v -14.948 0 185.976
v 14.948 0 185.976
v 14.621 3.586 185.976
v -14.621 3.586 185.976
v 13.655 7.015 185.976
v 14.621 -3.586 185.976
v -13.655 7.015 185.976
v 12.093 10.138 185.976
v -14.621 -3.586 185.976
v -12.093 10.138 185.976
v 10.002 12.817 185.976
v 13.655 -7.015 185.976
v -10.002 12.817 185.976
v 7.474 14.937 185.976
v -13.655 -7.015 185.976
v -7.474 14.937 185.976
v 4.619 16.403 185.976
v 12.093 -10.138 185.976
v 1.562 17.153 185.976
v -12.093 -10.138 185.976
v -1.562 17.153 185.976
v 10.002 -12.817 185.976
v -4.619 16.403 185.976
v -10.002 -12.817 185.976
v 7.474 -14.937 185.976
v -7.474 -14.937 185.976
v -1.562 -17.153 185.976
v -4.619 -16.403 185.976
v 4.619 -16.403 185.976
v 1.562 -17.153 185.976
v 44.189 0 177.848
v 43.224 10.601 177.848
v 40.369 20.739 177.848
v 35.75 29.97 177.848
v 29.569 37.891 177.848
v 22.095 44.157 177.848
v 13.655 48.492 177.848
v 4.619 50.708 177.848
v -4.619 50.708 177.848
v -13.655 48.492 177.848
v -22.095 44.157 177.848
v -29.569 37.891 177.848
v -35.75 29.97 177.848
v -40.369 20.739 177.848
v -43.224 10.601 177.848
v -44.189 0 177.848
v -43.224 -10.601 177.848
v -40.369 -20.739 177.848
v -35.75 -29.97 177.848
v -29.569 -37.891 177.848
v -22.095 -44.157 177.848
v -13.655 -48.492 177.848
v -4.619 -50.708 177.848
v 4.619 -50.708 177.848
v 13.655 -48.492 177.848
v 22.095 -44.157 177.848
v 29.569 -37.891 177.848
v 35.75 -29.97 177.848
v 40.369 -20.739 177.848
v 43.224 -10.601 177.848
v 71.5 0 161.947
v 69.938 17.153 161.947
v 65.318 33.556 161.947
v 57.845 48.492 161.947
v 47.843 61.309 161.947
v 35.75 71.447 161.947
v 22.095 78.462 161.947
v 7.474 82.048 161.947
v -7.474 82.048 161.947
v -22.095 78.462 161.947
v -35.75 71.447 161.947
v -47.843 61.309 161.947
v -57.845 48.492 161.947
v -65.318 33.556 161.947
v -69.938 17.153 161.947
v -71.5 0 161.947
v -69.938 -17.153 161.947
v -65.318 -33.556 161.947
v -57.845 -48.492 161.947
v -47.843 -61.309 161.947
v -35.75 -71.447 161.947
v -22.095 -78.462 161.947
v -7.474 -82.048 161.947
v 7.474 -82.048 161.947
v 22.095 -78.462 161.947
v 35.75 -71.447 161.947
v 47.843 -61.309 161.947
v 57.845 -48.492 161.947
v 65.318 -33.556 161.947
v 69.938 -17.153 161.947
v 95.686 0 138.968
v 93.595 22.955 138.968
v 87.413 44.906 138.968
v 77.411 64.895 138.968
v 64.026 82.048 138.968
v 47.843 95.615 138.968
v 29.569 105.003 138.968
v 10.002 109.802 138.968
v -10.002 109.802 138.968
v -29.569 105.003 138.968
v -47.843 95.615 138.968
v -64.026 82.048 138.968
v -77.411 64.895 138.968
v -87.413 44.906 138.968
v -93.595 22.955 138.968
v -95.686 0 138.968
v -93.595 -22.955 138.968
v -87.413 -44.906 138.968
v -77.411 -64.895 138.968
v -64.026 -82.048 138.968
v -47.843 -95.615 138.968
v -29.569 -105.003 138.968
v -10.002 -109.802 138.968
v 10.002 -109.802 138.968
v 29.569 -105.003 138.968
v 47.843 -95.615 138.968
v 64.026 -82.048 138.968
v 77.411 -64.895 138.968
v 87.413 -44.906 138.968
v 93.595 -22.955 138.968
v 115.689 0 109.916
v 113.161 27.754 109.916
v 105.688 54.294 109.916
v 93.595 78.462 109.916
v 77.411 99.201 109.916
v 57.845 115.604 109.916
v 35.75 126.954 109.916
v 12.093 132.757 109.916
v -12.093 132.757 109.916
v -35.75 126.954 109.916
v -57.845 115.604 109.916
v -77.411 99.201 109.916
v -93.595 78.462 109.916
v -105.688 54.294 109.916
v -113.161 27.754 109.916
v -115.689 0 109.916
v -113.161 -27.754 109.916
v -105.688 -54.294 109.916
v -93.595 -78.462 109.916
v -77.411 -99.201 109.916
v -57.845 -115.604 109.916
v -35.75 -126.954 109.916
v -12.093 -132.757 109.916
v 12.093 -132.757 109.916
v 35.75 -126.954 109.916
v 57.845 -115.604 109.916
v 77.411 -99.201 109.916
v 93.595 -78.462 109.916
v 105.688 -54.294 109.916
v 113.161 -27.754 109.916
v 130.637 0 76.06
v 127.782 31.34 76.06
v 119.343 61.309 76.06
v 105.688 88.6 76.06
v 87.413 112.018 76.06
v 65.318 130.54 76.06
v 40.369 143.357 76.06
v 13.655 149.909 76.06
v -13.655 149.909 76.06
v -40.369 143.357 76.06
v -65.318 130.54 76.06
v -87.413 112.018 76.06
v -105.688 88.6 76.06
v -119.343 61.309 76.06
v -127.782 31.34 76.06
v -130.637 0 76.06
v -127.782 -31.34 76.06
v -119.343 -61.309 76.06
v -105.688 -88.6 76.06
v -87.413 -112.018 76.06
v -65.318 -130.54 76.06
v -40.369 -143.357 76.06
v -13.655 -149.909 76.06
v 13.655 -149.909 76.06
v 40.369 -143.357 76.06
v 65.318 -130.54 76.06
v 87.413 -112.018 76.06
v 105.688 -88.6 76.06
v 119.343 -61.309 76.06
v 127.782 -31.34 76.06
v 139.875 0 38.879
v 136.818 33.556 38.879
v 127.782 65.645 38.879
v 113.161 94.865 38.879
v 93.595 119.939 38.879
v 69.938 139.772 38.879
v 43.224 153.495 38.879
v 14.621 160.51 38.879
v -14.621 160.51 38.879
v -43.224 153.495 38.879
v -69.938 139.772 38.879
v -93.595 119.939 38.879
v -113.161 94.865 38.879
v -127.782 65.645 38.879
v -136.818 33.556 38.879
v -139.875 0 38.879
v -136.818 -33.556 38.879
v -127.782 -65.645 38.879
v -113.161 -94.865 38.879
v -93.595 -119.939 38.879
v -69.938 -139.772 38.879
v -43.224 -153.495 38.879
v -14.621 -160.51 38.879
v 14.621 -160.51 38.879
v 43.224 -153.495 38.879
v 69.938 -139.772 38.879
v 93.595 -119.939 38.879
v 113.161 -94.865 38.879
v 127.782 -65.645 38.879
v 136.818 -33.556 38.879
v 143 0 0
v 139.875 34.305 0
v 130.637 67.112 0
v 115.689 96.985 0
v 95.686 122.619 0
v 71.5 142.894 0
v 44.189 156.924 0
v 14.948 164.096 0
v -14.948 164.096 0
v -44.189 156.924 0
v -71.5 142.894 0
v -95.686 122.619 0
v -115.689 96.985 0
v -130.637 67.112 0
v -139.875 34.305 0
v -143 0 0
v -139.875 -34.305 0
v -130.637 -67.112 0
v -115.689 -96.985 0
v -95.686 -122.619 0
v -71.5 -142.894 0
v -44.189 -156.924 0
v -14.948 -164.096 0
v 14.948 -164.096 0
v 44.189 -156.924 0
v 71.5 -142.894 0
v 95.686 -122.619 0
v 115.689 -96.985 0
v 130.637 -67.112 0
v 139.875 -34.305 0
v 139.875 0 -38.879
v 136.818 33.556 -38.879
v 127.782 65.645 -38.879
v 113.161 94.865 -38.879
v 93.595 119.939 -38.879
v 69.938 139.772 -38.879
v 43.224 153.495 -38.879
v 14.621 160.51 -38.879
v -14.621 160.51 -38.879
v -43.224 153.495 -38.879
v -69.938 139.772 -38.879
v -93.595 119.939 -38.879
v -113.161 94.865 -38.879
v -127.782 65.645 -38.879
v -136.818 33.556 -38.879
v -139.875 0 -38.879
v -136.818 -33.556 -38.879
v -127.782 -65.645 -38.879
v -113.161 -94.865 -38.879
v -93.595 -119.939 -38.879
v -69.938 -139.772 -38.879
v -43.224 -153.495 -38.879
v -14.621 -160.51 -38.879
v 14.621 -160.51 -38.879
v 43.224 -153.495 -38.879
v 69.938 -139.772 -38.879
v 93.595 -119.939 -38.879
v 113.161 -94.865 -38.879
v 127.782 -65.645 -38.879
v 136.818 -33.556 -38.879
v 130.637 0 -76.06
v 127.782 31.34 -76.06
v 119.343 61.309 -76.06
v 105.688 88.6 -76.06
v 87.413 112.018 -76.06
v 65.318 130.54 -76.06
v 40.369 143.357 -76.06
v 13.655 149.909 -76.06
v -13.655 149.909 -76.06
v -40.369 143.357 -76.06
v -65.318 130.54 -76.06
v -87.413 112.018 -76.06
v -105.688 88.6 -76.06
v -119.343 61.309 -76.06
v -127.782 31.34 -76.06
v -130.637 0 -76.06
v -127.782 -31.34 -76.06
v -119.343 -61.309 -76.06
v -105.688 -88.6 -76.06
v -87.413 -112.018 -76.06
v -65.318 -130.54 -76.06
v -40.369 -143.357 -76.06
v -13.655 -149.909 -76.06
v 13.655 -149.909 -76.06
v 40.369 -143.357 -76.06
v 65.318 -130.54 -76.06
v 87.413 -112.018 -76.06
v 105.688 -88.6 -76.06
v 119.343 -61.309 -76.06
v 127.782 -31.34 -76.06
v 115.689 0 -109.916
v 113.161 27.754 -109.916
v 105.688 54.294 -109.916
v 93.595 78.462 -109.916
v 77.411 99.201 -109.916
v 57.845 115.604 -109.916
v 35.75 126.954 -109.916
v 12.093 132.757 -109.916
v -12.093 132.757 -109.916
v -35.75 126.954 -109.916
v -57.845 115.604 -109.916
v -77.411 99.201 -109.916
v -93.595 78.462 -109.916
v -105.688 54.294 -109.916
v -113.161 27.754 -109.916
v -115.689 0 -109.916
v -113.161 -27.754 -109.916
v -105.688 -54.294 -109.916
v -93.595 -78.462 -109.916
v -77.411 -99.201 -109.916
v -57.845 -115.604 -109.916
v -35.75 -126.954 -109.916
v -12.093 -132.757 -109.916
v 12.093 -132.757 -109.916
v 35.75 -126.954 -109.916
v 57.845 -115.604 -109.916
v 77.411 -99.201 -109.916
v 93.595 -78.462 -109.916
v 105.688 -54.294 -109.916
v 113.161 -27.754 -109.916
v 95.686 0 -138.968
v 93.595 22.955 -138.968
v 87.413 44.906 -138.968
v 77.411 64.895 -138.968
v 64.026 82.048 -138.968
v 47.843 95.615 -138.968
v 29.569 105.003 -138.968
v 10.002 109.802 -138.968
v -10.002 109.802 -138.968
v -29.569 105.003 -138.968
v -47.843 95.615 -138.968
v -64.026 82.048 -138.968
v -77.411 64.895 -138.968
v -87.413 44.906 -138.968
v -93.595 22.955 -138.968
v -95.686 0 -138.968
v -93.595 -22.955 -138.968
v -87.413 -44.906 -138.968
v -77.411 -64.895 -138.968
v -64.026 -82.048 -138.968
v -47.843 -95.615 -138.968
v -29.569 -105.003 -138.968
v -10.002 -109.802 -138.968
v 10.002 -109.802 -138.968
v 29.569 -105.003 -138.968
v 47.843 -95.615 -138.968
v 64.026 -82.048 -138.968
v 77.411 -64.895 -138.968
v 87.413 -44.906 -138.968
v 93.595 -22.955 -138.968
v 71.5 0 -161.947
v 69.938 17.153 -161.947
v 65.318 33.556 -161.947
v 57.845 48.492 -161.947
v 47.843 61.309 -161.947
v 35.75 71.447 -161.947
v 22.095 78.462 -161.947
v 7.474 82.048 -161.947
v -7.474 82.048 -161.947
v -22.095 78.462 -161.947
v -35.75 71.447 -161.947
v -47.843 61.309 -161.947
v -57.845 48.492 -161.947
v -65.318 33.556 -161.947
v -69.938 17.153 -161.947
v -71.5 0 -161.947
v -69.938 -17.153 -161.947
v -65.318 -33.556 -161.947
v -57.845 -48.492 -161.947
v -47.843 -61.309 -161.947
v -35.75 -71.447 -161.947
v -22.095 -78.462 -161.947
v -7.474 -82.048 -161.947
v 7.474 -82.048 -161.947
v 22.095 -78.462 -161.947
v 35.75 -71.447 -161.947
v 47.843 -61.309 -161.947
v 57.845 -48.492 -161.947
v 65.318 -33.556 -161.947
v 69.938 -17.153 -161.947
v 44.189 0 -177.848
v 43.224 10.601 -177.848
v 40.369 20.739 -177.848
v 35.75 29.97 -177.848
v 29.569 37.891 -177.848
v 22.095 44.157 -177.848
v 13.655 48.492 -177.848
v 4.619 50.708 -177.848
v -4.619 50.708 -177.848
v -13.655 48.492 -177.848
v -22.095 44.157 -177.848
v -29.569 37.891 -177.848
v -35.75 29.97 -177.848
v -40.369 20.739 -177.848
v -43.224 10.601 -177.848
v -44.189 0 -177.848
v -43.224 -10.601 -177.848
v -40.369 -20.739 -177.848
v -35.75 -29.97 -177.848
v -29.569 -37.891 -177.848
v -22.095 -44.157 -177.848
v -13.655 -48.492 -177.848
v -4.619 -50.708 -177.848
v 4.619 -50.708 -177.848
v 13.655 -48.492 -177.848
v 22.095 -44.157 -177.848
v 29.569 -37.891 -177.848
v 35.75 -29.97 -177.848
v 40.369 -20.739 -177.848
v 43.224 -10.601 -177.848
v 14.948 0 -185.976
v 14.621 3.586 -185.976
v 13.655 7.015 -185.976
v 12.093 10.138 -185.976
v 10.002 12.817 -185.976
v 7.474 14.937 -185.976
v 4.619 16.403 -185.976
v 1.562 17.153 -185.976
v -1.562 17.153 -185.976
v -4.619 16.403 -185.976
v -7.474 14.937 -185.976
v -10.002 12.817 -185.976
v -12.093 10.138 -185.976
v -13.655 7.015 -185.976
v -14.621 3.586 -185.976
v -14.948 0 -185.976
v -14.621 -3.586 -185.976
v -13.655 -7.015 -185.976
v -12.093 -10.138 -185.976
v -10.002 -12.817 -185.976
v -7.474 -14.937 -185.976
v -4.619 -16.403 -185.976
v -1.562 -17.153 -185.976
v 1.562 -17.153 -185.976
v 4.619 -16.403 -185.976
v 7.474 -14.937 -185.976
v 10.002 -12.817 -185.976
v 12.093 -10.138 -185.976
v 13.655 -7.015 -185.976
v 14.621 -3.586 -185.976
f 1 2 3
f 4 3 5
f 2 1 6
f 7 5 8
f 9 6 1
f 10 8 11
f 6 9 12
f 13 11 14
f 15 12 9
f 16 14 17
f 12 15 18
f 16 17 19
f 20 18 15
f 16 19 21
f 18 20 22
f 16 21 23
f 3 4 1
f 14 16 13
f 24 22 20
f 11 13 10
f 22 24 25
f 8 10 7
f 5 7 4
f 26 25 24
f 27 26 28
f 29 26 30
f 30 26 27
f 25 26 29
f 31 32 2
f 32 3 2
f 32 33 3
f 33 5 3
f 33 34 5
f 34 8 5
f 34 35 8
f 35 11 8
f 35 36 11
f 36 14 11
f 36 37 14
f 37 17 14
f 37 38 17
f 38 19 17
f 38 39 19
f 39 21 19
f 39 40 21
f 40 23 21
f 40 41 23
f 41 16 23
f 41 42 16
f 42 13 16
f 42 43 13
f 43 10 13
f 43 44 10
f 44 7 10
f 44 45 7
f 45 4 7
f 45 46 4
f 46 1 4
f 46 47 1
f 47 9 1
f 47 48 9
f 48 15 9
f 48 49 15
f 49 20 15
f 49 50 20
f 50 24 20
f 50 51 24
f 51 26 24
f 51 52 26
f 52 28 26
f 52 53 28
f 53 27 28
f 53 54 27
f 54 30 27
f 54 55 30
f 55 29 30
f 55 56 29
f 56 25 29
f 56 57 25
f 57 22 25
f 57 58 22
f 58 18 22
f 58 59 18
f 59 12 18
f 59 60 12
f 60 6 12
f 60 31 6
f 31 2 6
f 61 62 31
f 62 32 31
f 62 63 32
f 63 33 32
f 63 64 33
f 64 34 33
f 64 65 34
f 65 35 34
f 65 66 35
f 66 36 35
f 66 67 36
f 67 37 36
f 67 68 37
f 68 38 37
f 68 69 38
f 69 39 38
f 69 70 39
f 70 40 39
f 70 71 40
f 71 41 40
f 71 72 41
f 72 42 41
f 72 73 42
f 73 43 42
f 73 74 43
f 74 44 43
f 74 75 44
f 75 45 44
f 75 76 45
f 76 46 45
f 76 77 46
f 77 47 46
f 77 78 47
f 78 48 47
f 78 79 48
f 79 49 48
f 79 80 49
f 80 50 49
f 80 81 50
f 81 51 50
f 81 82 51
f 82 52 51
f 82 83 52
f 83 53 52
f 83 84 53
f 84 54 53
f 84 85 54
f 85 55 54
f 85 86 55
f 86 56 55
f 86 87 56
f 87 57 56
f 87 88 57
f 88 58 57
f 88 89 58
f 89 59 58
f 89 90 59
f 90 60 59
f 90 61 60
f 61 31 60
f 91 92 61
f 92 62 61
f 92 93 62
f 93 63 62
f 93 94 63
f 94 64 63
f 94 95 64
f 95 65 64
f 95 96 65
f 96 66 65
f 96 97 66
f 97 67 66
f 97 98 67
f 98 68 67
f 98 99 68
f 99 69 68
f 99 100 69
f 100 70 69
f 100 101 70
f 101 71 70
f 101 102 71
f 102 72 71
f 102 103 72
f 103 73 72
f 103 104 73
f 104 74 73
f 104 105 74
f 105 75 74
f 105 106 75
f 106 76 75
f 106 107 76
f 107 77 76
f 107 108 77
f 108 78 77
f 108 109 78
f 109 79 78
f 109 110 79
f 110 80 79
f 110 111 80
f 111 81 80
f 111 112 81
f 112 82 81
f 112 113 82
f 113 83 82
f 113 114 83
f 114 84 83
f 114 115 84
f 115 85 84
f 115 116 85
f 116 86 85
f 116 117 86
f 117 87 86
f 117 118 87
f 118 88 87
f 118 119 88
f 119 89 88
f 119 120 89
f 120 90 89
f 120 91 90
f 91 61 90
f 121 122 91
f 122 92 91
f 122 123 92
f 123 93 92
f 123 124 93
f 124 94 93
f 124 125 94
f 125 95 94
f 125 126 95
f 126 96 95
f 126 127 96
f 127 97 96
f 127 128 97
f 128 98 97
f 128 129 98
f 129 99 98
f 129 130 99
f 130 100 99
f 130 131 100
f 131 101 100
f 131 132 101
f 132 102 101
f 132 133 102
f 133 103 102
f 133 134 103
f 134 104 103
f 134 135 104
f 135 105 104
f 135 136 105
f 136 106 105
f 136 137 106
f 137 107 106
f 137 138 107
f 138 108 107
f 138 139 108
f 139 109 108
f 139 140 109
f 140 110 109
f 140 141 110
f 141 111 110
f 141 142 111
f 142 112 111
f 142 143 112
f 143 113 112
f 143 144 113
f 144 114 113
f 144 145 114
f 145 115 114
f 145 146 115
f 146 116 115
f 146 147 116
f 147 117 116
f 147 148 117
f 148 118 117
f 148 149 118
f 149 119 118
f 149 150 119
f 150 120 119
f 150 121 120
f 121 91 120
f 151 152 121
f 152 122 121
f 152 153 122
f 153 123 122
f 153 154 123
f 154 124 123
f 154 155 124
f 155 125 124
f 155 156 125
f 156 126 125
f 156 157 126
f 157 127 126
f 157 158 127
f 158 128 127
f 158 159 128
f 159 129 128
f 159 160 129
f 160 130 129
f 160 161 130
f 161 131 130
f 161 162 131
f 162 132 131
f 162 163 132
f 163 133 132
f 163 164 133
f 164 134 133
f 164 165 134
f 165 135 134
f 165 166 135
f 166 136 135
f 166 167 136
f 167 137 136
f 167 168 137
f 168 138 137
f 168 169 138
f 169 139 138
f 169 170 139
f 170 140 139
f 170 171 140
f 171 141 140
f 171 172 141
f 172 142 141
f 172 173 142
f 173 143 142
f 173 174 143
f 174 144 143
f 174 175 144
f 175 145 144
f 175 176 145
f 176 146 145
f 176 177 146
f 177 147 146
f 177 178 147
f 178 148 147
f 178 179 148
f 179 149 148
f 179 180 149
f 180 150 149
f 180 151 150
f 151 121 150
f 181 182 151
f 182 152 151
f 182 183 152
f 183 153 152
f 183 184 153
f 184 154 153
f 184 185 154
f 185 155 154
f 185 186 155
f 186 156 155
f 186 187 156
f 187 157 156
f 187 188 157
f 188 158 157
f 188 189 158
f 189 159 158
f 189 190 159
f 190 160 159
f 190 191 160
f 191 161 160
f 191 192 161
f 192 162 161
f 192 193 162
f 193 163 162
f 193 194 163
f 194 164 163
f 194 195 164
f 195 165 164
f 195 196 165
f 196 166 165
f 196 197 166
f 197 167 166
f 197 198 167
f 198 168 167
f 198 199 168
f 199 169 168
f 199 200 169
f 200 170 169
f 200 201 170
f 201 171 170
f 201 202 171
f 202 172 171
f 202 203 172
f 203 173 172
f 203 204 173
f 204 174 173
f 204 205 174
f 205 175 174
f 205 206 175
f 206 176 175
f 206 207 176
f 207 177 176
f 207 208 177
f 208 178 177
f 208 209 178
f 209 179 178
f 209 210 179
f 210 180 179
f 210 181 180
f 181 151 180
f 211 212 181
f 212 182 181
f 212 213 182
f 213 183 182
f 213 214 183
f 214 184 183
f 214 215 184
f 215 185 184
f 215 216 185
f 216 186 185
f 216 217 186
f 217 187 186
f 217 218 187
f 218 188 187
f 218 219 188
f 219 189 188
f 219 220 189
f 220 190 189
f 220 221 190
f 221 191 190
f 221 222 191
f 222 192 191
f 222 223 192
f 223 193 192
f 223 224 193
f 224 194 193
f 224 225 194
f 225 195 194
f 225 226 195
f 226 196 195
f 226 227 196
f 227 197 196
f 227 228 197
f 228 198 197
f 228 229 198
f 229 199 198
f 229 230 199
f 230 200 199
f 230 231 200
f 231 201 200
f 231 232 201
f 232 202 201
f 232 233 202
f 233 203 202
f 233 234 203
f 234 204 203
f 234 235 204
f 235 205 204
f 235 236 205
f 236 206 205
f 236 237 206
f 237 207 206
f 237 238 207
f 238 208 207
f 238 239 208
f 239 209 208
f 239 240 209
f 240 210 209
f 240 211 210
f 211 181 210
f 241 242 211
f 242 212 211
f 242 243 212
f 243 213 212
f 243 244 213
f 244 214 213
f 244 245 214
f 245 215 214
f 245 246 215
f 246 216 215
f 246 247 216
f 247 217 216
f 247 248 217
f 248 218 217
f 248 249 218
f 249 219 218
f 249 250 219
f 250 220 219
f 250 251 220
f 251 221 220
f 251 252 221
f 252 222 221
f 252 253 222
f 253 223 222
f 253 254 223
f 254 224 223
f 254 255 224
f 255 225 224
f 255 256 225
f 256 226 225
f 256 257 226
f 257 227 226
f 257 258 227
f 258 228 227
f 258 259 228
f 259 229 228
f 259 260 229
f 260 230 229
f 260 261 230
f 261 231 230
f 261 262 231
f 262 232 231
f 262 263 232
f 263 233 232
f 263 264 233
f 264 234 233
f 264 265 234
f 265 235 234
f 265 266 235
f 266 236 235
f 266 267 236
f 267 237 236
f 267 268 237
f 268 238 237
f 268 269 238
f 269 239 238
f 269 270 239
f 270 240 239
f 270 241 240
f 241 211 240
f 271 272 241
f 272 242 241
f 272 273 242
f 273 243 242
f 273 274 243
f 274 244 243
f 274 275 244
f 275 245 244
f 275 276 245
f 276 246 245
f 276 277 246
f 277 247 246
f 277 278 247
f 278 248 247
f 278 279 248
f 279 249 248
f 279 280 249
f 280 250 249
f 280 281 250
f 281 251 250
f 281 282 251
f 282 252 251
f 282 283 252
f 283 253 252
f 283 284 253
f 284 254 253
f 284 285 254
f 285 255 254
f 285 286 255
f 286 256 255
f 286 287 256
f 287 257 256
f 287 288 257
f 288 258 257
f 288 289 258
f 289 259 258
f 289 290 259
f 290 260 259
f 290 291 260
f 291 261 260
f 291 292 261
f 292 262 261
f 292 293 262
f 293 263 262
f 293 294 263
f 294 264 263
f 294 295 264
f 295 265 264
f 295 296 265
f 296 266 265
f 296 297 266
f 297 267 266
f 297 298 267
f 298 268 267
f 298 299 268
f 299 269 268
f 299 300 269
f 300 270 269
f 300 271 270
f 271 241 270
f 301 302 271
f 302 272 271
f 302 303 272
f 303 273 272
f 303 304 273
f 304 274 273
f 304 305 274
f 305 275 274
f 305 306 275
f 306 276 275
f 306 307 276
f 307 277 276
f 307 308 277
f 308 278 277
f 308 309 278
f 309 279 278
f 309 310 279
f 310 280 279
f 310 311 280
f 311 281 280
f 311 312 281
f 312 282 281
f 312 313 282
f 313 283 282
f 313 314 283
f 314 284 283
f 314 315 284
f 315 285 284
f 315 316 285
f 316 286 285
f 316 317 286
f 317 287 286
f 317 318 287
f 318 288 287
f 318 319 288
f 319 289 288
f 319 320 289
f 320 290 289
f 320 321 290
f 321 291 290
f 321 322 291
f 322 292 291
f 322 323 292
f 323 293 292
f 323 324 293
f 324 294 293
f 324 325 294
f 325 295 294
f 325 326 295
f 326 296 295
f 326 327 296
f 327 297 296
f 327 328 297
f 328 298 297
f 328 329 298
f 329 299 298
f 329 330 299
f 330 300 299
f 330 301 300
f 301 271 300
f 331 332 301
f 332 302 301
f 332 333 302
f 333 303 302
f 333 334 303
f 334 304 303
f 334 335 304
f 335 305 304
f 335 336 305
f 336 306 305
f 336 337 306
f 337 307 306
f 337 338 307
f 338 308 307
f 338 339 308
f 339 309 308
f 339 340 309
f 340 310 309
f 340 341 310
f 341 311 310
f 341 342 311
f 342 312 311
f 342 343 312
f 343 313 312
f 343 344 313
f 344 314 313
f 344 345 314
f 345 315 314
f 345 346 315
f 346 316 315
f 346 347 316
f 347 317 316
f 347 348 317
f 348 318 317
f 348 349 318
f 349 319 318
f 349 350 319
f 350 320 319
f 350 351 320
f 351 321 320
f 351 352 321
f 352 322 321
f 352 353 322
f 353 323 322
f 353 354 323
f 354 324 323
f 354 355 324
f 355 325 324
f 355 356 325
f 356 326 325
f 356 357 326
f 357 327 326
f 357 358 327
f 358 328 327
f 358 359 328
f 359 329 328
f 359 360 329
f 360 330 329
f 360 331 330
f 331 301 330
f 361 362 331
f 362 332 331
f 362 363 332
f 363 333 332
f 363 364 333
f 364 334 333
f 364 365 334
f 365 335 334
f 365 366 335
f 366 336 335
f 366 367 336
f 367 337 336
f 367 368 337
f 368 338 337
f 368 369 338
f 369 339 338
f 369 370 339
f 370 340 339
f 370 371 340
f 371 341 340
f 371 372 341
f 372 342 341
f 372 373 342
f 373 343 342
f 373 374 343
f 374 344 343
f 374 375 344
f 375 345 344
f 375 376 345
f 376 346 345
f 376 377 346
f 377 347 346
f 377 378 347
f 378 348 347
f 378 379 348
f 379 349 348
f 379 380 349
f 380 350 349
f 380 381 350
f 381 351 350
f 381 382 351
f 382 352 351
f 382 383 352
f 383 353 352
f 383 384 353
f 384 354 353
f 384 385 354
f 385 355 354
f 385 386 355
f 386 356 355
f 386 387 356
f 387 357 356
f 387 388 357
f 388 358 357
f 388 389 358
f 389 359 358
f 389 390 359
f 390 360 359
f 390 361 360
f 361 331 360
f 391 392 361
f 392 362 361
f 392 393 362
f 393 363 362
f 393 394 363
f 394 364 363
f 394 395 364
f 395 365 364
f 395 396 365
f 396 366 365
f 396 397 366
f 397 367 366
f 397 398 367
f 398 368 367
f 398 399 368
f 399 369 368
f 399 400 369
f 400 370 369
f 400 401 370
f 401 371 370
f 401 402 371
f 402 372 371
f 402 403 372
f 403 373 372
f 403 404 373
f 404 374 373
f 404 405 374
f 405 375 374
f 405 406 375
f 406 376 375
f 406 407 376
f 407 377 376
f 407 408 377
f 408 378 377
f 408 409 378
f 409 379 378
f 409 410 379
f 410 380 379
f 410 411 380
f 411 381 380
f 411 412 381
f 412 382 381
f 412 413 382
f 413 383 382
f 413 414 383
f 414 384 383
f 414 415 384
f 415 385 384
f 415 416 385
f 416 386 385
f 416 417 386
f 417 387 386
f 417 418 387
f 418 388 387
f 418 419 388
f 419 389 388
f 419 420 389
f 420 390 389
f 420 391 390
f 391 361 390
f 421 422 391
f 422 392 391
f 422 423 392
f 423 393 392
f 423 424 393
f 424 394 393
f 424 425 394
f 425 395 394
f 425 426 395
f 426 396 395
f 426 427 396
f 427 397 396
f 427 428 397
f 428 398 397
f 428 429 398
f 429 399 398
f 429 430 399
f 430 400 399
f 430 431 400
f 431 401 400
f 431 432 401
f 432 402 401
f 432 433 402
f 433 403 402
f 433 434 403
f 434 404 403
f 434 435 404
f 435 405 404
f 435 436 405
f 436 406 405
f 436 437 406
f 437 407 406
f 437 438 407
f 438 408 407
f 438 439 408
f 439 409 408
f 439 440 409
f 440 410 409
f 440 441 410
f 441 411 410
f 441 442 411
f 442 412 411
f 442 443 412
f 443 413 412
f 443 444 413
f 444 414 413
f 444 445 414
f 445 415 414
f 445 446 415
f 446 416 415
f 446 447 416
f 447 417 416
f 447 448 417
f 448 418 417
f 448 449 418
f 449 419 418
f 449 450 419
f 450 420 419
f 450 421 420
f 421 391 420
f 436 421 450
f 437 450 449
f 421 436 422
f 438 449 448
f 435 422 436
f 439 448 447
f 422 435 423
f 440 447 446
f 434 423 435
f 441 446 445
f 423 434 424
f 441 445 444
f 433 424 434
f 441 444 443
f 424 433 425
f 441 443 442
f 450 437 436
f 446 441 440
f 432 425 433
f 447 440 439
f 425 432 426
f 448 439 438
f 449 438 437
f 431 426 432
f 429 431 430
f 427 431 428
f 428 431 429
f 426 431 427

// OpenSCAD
// Generated by SolidPython 1.0.1 on 2020-07-29 00:46:51


scale(v = [13, 15, 17]) {
	sphere(r = 11);
}
/***********************************************
*********      SolidPython code:      **********
************************************************
 
# import packages: SolidPython
from solid import *
from solid.utils import *
from itertools import chain, combinations, permutations


class Resize:

    def __init__(self, scad_file):
        self.scad_file = scad_file
        #self.scad_file = import_scad(scad_file)
        # cone/cylinder param:
        self.r1 = 0
        self.r2 = 0
        self.h = 0
        # rectangular prism param:
        self.w = 0
        self.l = 0
        # ellipse param:
        self.r = 0

    # import OpenScad code (file name corresponds to shape)


    # classify shape + parameters
    def assign(self, param1, param2, param3):
        if self.scad_file == 'cone.scad':
            self.r1 = param1
            self.r2 = param2
            self.h = param3
        elif self.scad_file == 'cylinder.scad':
            self.r1 = param1
            self.r2 = param2
            self.h = param3
        elif self.scad_file == 'rectangularPrism.scad':
            self.h = param1
            self.l = param2
            self.w = param3
        else:
            self.r = param1
            self.h = param2

    # resize parameters
    def iterate(self):
        x = range(3, 20, 2)
        i = 1
        if self.scad_file == 'cone.scad':
            tempList = list(permutations(x, 2))
            for temp in tempList:
                param1 = temp[0]
                param2 = temp[1]
                filepath = 'produced_scad_files/' + 'cone' + str(param1) + '_' + str(param2) + '_' + '.scad'
                scad_render_to_file(cylinder(h=param1, r1=param2, r2=0), filepath)

        elif self.scad_file == 'cylinder.scad':
            tempList = list(permutations(x, 3))
            for temp in tempList:
                param1 = temp[0]
                param2 = temp[1]
                filepath = 'produced_scad_files/' + 'cylinder' + str(param1) + '_' + str(param2) + '_' + '.scad'
                scad_render_to_file(cylinder(h=param1, r1=param2, r2=param2), filepath)

        elif self.scad_file == 'rectangularPrism.scad':
            tempList = list(permutations(x, 3))
            for temp in tempList:
                param1 = temp[0]
                param2 = temp[1]
                param3 = temp[2]
                filepath = 'produced_scad_files/' + 'rectangularPrism' + str(param1) + '_' + str(param2) + '_' + str(
                    param3) + '.scad'
                scad_render_to_file(cube(size=(param1, param2, param3)), filepath)

        elif self.scad_file == 'ellipse.scad':
            tempList = list(permutations(x, 4))
            for temp in tempList:
                param1 = temp[0]
                param2 = temp[1]
                param3 = temp[2]
                param4 = temp[3]
                filepath = 'produced_scad_files/' + 'ellipse' + str(param1) + '_' + str(param2) + '_' + str(param3) + '_' + str(param4) + '.scad'
                scad_render_to_file(scale([param1, param2, param3])(sphere(r=param4)), filepath)

    def render_to_scadfile(self):
        scad_render_to_file(scad, 'example.scad') 
 
************************************************/
